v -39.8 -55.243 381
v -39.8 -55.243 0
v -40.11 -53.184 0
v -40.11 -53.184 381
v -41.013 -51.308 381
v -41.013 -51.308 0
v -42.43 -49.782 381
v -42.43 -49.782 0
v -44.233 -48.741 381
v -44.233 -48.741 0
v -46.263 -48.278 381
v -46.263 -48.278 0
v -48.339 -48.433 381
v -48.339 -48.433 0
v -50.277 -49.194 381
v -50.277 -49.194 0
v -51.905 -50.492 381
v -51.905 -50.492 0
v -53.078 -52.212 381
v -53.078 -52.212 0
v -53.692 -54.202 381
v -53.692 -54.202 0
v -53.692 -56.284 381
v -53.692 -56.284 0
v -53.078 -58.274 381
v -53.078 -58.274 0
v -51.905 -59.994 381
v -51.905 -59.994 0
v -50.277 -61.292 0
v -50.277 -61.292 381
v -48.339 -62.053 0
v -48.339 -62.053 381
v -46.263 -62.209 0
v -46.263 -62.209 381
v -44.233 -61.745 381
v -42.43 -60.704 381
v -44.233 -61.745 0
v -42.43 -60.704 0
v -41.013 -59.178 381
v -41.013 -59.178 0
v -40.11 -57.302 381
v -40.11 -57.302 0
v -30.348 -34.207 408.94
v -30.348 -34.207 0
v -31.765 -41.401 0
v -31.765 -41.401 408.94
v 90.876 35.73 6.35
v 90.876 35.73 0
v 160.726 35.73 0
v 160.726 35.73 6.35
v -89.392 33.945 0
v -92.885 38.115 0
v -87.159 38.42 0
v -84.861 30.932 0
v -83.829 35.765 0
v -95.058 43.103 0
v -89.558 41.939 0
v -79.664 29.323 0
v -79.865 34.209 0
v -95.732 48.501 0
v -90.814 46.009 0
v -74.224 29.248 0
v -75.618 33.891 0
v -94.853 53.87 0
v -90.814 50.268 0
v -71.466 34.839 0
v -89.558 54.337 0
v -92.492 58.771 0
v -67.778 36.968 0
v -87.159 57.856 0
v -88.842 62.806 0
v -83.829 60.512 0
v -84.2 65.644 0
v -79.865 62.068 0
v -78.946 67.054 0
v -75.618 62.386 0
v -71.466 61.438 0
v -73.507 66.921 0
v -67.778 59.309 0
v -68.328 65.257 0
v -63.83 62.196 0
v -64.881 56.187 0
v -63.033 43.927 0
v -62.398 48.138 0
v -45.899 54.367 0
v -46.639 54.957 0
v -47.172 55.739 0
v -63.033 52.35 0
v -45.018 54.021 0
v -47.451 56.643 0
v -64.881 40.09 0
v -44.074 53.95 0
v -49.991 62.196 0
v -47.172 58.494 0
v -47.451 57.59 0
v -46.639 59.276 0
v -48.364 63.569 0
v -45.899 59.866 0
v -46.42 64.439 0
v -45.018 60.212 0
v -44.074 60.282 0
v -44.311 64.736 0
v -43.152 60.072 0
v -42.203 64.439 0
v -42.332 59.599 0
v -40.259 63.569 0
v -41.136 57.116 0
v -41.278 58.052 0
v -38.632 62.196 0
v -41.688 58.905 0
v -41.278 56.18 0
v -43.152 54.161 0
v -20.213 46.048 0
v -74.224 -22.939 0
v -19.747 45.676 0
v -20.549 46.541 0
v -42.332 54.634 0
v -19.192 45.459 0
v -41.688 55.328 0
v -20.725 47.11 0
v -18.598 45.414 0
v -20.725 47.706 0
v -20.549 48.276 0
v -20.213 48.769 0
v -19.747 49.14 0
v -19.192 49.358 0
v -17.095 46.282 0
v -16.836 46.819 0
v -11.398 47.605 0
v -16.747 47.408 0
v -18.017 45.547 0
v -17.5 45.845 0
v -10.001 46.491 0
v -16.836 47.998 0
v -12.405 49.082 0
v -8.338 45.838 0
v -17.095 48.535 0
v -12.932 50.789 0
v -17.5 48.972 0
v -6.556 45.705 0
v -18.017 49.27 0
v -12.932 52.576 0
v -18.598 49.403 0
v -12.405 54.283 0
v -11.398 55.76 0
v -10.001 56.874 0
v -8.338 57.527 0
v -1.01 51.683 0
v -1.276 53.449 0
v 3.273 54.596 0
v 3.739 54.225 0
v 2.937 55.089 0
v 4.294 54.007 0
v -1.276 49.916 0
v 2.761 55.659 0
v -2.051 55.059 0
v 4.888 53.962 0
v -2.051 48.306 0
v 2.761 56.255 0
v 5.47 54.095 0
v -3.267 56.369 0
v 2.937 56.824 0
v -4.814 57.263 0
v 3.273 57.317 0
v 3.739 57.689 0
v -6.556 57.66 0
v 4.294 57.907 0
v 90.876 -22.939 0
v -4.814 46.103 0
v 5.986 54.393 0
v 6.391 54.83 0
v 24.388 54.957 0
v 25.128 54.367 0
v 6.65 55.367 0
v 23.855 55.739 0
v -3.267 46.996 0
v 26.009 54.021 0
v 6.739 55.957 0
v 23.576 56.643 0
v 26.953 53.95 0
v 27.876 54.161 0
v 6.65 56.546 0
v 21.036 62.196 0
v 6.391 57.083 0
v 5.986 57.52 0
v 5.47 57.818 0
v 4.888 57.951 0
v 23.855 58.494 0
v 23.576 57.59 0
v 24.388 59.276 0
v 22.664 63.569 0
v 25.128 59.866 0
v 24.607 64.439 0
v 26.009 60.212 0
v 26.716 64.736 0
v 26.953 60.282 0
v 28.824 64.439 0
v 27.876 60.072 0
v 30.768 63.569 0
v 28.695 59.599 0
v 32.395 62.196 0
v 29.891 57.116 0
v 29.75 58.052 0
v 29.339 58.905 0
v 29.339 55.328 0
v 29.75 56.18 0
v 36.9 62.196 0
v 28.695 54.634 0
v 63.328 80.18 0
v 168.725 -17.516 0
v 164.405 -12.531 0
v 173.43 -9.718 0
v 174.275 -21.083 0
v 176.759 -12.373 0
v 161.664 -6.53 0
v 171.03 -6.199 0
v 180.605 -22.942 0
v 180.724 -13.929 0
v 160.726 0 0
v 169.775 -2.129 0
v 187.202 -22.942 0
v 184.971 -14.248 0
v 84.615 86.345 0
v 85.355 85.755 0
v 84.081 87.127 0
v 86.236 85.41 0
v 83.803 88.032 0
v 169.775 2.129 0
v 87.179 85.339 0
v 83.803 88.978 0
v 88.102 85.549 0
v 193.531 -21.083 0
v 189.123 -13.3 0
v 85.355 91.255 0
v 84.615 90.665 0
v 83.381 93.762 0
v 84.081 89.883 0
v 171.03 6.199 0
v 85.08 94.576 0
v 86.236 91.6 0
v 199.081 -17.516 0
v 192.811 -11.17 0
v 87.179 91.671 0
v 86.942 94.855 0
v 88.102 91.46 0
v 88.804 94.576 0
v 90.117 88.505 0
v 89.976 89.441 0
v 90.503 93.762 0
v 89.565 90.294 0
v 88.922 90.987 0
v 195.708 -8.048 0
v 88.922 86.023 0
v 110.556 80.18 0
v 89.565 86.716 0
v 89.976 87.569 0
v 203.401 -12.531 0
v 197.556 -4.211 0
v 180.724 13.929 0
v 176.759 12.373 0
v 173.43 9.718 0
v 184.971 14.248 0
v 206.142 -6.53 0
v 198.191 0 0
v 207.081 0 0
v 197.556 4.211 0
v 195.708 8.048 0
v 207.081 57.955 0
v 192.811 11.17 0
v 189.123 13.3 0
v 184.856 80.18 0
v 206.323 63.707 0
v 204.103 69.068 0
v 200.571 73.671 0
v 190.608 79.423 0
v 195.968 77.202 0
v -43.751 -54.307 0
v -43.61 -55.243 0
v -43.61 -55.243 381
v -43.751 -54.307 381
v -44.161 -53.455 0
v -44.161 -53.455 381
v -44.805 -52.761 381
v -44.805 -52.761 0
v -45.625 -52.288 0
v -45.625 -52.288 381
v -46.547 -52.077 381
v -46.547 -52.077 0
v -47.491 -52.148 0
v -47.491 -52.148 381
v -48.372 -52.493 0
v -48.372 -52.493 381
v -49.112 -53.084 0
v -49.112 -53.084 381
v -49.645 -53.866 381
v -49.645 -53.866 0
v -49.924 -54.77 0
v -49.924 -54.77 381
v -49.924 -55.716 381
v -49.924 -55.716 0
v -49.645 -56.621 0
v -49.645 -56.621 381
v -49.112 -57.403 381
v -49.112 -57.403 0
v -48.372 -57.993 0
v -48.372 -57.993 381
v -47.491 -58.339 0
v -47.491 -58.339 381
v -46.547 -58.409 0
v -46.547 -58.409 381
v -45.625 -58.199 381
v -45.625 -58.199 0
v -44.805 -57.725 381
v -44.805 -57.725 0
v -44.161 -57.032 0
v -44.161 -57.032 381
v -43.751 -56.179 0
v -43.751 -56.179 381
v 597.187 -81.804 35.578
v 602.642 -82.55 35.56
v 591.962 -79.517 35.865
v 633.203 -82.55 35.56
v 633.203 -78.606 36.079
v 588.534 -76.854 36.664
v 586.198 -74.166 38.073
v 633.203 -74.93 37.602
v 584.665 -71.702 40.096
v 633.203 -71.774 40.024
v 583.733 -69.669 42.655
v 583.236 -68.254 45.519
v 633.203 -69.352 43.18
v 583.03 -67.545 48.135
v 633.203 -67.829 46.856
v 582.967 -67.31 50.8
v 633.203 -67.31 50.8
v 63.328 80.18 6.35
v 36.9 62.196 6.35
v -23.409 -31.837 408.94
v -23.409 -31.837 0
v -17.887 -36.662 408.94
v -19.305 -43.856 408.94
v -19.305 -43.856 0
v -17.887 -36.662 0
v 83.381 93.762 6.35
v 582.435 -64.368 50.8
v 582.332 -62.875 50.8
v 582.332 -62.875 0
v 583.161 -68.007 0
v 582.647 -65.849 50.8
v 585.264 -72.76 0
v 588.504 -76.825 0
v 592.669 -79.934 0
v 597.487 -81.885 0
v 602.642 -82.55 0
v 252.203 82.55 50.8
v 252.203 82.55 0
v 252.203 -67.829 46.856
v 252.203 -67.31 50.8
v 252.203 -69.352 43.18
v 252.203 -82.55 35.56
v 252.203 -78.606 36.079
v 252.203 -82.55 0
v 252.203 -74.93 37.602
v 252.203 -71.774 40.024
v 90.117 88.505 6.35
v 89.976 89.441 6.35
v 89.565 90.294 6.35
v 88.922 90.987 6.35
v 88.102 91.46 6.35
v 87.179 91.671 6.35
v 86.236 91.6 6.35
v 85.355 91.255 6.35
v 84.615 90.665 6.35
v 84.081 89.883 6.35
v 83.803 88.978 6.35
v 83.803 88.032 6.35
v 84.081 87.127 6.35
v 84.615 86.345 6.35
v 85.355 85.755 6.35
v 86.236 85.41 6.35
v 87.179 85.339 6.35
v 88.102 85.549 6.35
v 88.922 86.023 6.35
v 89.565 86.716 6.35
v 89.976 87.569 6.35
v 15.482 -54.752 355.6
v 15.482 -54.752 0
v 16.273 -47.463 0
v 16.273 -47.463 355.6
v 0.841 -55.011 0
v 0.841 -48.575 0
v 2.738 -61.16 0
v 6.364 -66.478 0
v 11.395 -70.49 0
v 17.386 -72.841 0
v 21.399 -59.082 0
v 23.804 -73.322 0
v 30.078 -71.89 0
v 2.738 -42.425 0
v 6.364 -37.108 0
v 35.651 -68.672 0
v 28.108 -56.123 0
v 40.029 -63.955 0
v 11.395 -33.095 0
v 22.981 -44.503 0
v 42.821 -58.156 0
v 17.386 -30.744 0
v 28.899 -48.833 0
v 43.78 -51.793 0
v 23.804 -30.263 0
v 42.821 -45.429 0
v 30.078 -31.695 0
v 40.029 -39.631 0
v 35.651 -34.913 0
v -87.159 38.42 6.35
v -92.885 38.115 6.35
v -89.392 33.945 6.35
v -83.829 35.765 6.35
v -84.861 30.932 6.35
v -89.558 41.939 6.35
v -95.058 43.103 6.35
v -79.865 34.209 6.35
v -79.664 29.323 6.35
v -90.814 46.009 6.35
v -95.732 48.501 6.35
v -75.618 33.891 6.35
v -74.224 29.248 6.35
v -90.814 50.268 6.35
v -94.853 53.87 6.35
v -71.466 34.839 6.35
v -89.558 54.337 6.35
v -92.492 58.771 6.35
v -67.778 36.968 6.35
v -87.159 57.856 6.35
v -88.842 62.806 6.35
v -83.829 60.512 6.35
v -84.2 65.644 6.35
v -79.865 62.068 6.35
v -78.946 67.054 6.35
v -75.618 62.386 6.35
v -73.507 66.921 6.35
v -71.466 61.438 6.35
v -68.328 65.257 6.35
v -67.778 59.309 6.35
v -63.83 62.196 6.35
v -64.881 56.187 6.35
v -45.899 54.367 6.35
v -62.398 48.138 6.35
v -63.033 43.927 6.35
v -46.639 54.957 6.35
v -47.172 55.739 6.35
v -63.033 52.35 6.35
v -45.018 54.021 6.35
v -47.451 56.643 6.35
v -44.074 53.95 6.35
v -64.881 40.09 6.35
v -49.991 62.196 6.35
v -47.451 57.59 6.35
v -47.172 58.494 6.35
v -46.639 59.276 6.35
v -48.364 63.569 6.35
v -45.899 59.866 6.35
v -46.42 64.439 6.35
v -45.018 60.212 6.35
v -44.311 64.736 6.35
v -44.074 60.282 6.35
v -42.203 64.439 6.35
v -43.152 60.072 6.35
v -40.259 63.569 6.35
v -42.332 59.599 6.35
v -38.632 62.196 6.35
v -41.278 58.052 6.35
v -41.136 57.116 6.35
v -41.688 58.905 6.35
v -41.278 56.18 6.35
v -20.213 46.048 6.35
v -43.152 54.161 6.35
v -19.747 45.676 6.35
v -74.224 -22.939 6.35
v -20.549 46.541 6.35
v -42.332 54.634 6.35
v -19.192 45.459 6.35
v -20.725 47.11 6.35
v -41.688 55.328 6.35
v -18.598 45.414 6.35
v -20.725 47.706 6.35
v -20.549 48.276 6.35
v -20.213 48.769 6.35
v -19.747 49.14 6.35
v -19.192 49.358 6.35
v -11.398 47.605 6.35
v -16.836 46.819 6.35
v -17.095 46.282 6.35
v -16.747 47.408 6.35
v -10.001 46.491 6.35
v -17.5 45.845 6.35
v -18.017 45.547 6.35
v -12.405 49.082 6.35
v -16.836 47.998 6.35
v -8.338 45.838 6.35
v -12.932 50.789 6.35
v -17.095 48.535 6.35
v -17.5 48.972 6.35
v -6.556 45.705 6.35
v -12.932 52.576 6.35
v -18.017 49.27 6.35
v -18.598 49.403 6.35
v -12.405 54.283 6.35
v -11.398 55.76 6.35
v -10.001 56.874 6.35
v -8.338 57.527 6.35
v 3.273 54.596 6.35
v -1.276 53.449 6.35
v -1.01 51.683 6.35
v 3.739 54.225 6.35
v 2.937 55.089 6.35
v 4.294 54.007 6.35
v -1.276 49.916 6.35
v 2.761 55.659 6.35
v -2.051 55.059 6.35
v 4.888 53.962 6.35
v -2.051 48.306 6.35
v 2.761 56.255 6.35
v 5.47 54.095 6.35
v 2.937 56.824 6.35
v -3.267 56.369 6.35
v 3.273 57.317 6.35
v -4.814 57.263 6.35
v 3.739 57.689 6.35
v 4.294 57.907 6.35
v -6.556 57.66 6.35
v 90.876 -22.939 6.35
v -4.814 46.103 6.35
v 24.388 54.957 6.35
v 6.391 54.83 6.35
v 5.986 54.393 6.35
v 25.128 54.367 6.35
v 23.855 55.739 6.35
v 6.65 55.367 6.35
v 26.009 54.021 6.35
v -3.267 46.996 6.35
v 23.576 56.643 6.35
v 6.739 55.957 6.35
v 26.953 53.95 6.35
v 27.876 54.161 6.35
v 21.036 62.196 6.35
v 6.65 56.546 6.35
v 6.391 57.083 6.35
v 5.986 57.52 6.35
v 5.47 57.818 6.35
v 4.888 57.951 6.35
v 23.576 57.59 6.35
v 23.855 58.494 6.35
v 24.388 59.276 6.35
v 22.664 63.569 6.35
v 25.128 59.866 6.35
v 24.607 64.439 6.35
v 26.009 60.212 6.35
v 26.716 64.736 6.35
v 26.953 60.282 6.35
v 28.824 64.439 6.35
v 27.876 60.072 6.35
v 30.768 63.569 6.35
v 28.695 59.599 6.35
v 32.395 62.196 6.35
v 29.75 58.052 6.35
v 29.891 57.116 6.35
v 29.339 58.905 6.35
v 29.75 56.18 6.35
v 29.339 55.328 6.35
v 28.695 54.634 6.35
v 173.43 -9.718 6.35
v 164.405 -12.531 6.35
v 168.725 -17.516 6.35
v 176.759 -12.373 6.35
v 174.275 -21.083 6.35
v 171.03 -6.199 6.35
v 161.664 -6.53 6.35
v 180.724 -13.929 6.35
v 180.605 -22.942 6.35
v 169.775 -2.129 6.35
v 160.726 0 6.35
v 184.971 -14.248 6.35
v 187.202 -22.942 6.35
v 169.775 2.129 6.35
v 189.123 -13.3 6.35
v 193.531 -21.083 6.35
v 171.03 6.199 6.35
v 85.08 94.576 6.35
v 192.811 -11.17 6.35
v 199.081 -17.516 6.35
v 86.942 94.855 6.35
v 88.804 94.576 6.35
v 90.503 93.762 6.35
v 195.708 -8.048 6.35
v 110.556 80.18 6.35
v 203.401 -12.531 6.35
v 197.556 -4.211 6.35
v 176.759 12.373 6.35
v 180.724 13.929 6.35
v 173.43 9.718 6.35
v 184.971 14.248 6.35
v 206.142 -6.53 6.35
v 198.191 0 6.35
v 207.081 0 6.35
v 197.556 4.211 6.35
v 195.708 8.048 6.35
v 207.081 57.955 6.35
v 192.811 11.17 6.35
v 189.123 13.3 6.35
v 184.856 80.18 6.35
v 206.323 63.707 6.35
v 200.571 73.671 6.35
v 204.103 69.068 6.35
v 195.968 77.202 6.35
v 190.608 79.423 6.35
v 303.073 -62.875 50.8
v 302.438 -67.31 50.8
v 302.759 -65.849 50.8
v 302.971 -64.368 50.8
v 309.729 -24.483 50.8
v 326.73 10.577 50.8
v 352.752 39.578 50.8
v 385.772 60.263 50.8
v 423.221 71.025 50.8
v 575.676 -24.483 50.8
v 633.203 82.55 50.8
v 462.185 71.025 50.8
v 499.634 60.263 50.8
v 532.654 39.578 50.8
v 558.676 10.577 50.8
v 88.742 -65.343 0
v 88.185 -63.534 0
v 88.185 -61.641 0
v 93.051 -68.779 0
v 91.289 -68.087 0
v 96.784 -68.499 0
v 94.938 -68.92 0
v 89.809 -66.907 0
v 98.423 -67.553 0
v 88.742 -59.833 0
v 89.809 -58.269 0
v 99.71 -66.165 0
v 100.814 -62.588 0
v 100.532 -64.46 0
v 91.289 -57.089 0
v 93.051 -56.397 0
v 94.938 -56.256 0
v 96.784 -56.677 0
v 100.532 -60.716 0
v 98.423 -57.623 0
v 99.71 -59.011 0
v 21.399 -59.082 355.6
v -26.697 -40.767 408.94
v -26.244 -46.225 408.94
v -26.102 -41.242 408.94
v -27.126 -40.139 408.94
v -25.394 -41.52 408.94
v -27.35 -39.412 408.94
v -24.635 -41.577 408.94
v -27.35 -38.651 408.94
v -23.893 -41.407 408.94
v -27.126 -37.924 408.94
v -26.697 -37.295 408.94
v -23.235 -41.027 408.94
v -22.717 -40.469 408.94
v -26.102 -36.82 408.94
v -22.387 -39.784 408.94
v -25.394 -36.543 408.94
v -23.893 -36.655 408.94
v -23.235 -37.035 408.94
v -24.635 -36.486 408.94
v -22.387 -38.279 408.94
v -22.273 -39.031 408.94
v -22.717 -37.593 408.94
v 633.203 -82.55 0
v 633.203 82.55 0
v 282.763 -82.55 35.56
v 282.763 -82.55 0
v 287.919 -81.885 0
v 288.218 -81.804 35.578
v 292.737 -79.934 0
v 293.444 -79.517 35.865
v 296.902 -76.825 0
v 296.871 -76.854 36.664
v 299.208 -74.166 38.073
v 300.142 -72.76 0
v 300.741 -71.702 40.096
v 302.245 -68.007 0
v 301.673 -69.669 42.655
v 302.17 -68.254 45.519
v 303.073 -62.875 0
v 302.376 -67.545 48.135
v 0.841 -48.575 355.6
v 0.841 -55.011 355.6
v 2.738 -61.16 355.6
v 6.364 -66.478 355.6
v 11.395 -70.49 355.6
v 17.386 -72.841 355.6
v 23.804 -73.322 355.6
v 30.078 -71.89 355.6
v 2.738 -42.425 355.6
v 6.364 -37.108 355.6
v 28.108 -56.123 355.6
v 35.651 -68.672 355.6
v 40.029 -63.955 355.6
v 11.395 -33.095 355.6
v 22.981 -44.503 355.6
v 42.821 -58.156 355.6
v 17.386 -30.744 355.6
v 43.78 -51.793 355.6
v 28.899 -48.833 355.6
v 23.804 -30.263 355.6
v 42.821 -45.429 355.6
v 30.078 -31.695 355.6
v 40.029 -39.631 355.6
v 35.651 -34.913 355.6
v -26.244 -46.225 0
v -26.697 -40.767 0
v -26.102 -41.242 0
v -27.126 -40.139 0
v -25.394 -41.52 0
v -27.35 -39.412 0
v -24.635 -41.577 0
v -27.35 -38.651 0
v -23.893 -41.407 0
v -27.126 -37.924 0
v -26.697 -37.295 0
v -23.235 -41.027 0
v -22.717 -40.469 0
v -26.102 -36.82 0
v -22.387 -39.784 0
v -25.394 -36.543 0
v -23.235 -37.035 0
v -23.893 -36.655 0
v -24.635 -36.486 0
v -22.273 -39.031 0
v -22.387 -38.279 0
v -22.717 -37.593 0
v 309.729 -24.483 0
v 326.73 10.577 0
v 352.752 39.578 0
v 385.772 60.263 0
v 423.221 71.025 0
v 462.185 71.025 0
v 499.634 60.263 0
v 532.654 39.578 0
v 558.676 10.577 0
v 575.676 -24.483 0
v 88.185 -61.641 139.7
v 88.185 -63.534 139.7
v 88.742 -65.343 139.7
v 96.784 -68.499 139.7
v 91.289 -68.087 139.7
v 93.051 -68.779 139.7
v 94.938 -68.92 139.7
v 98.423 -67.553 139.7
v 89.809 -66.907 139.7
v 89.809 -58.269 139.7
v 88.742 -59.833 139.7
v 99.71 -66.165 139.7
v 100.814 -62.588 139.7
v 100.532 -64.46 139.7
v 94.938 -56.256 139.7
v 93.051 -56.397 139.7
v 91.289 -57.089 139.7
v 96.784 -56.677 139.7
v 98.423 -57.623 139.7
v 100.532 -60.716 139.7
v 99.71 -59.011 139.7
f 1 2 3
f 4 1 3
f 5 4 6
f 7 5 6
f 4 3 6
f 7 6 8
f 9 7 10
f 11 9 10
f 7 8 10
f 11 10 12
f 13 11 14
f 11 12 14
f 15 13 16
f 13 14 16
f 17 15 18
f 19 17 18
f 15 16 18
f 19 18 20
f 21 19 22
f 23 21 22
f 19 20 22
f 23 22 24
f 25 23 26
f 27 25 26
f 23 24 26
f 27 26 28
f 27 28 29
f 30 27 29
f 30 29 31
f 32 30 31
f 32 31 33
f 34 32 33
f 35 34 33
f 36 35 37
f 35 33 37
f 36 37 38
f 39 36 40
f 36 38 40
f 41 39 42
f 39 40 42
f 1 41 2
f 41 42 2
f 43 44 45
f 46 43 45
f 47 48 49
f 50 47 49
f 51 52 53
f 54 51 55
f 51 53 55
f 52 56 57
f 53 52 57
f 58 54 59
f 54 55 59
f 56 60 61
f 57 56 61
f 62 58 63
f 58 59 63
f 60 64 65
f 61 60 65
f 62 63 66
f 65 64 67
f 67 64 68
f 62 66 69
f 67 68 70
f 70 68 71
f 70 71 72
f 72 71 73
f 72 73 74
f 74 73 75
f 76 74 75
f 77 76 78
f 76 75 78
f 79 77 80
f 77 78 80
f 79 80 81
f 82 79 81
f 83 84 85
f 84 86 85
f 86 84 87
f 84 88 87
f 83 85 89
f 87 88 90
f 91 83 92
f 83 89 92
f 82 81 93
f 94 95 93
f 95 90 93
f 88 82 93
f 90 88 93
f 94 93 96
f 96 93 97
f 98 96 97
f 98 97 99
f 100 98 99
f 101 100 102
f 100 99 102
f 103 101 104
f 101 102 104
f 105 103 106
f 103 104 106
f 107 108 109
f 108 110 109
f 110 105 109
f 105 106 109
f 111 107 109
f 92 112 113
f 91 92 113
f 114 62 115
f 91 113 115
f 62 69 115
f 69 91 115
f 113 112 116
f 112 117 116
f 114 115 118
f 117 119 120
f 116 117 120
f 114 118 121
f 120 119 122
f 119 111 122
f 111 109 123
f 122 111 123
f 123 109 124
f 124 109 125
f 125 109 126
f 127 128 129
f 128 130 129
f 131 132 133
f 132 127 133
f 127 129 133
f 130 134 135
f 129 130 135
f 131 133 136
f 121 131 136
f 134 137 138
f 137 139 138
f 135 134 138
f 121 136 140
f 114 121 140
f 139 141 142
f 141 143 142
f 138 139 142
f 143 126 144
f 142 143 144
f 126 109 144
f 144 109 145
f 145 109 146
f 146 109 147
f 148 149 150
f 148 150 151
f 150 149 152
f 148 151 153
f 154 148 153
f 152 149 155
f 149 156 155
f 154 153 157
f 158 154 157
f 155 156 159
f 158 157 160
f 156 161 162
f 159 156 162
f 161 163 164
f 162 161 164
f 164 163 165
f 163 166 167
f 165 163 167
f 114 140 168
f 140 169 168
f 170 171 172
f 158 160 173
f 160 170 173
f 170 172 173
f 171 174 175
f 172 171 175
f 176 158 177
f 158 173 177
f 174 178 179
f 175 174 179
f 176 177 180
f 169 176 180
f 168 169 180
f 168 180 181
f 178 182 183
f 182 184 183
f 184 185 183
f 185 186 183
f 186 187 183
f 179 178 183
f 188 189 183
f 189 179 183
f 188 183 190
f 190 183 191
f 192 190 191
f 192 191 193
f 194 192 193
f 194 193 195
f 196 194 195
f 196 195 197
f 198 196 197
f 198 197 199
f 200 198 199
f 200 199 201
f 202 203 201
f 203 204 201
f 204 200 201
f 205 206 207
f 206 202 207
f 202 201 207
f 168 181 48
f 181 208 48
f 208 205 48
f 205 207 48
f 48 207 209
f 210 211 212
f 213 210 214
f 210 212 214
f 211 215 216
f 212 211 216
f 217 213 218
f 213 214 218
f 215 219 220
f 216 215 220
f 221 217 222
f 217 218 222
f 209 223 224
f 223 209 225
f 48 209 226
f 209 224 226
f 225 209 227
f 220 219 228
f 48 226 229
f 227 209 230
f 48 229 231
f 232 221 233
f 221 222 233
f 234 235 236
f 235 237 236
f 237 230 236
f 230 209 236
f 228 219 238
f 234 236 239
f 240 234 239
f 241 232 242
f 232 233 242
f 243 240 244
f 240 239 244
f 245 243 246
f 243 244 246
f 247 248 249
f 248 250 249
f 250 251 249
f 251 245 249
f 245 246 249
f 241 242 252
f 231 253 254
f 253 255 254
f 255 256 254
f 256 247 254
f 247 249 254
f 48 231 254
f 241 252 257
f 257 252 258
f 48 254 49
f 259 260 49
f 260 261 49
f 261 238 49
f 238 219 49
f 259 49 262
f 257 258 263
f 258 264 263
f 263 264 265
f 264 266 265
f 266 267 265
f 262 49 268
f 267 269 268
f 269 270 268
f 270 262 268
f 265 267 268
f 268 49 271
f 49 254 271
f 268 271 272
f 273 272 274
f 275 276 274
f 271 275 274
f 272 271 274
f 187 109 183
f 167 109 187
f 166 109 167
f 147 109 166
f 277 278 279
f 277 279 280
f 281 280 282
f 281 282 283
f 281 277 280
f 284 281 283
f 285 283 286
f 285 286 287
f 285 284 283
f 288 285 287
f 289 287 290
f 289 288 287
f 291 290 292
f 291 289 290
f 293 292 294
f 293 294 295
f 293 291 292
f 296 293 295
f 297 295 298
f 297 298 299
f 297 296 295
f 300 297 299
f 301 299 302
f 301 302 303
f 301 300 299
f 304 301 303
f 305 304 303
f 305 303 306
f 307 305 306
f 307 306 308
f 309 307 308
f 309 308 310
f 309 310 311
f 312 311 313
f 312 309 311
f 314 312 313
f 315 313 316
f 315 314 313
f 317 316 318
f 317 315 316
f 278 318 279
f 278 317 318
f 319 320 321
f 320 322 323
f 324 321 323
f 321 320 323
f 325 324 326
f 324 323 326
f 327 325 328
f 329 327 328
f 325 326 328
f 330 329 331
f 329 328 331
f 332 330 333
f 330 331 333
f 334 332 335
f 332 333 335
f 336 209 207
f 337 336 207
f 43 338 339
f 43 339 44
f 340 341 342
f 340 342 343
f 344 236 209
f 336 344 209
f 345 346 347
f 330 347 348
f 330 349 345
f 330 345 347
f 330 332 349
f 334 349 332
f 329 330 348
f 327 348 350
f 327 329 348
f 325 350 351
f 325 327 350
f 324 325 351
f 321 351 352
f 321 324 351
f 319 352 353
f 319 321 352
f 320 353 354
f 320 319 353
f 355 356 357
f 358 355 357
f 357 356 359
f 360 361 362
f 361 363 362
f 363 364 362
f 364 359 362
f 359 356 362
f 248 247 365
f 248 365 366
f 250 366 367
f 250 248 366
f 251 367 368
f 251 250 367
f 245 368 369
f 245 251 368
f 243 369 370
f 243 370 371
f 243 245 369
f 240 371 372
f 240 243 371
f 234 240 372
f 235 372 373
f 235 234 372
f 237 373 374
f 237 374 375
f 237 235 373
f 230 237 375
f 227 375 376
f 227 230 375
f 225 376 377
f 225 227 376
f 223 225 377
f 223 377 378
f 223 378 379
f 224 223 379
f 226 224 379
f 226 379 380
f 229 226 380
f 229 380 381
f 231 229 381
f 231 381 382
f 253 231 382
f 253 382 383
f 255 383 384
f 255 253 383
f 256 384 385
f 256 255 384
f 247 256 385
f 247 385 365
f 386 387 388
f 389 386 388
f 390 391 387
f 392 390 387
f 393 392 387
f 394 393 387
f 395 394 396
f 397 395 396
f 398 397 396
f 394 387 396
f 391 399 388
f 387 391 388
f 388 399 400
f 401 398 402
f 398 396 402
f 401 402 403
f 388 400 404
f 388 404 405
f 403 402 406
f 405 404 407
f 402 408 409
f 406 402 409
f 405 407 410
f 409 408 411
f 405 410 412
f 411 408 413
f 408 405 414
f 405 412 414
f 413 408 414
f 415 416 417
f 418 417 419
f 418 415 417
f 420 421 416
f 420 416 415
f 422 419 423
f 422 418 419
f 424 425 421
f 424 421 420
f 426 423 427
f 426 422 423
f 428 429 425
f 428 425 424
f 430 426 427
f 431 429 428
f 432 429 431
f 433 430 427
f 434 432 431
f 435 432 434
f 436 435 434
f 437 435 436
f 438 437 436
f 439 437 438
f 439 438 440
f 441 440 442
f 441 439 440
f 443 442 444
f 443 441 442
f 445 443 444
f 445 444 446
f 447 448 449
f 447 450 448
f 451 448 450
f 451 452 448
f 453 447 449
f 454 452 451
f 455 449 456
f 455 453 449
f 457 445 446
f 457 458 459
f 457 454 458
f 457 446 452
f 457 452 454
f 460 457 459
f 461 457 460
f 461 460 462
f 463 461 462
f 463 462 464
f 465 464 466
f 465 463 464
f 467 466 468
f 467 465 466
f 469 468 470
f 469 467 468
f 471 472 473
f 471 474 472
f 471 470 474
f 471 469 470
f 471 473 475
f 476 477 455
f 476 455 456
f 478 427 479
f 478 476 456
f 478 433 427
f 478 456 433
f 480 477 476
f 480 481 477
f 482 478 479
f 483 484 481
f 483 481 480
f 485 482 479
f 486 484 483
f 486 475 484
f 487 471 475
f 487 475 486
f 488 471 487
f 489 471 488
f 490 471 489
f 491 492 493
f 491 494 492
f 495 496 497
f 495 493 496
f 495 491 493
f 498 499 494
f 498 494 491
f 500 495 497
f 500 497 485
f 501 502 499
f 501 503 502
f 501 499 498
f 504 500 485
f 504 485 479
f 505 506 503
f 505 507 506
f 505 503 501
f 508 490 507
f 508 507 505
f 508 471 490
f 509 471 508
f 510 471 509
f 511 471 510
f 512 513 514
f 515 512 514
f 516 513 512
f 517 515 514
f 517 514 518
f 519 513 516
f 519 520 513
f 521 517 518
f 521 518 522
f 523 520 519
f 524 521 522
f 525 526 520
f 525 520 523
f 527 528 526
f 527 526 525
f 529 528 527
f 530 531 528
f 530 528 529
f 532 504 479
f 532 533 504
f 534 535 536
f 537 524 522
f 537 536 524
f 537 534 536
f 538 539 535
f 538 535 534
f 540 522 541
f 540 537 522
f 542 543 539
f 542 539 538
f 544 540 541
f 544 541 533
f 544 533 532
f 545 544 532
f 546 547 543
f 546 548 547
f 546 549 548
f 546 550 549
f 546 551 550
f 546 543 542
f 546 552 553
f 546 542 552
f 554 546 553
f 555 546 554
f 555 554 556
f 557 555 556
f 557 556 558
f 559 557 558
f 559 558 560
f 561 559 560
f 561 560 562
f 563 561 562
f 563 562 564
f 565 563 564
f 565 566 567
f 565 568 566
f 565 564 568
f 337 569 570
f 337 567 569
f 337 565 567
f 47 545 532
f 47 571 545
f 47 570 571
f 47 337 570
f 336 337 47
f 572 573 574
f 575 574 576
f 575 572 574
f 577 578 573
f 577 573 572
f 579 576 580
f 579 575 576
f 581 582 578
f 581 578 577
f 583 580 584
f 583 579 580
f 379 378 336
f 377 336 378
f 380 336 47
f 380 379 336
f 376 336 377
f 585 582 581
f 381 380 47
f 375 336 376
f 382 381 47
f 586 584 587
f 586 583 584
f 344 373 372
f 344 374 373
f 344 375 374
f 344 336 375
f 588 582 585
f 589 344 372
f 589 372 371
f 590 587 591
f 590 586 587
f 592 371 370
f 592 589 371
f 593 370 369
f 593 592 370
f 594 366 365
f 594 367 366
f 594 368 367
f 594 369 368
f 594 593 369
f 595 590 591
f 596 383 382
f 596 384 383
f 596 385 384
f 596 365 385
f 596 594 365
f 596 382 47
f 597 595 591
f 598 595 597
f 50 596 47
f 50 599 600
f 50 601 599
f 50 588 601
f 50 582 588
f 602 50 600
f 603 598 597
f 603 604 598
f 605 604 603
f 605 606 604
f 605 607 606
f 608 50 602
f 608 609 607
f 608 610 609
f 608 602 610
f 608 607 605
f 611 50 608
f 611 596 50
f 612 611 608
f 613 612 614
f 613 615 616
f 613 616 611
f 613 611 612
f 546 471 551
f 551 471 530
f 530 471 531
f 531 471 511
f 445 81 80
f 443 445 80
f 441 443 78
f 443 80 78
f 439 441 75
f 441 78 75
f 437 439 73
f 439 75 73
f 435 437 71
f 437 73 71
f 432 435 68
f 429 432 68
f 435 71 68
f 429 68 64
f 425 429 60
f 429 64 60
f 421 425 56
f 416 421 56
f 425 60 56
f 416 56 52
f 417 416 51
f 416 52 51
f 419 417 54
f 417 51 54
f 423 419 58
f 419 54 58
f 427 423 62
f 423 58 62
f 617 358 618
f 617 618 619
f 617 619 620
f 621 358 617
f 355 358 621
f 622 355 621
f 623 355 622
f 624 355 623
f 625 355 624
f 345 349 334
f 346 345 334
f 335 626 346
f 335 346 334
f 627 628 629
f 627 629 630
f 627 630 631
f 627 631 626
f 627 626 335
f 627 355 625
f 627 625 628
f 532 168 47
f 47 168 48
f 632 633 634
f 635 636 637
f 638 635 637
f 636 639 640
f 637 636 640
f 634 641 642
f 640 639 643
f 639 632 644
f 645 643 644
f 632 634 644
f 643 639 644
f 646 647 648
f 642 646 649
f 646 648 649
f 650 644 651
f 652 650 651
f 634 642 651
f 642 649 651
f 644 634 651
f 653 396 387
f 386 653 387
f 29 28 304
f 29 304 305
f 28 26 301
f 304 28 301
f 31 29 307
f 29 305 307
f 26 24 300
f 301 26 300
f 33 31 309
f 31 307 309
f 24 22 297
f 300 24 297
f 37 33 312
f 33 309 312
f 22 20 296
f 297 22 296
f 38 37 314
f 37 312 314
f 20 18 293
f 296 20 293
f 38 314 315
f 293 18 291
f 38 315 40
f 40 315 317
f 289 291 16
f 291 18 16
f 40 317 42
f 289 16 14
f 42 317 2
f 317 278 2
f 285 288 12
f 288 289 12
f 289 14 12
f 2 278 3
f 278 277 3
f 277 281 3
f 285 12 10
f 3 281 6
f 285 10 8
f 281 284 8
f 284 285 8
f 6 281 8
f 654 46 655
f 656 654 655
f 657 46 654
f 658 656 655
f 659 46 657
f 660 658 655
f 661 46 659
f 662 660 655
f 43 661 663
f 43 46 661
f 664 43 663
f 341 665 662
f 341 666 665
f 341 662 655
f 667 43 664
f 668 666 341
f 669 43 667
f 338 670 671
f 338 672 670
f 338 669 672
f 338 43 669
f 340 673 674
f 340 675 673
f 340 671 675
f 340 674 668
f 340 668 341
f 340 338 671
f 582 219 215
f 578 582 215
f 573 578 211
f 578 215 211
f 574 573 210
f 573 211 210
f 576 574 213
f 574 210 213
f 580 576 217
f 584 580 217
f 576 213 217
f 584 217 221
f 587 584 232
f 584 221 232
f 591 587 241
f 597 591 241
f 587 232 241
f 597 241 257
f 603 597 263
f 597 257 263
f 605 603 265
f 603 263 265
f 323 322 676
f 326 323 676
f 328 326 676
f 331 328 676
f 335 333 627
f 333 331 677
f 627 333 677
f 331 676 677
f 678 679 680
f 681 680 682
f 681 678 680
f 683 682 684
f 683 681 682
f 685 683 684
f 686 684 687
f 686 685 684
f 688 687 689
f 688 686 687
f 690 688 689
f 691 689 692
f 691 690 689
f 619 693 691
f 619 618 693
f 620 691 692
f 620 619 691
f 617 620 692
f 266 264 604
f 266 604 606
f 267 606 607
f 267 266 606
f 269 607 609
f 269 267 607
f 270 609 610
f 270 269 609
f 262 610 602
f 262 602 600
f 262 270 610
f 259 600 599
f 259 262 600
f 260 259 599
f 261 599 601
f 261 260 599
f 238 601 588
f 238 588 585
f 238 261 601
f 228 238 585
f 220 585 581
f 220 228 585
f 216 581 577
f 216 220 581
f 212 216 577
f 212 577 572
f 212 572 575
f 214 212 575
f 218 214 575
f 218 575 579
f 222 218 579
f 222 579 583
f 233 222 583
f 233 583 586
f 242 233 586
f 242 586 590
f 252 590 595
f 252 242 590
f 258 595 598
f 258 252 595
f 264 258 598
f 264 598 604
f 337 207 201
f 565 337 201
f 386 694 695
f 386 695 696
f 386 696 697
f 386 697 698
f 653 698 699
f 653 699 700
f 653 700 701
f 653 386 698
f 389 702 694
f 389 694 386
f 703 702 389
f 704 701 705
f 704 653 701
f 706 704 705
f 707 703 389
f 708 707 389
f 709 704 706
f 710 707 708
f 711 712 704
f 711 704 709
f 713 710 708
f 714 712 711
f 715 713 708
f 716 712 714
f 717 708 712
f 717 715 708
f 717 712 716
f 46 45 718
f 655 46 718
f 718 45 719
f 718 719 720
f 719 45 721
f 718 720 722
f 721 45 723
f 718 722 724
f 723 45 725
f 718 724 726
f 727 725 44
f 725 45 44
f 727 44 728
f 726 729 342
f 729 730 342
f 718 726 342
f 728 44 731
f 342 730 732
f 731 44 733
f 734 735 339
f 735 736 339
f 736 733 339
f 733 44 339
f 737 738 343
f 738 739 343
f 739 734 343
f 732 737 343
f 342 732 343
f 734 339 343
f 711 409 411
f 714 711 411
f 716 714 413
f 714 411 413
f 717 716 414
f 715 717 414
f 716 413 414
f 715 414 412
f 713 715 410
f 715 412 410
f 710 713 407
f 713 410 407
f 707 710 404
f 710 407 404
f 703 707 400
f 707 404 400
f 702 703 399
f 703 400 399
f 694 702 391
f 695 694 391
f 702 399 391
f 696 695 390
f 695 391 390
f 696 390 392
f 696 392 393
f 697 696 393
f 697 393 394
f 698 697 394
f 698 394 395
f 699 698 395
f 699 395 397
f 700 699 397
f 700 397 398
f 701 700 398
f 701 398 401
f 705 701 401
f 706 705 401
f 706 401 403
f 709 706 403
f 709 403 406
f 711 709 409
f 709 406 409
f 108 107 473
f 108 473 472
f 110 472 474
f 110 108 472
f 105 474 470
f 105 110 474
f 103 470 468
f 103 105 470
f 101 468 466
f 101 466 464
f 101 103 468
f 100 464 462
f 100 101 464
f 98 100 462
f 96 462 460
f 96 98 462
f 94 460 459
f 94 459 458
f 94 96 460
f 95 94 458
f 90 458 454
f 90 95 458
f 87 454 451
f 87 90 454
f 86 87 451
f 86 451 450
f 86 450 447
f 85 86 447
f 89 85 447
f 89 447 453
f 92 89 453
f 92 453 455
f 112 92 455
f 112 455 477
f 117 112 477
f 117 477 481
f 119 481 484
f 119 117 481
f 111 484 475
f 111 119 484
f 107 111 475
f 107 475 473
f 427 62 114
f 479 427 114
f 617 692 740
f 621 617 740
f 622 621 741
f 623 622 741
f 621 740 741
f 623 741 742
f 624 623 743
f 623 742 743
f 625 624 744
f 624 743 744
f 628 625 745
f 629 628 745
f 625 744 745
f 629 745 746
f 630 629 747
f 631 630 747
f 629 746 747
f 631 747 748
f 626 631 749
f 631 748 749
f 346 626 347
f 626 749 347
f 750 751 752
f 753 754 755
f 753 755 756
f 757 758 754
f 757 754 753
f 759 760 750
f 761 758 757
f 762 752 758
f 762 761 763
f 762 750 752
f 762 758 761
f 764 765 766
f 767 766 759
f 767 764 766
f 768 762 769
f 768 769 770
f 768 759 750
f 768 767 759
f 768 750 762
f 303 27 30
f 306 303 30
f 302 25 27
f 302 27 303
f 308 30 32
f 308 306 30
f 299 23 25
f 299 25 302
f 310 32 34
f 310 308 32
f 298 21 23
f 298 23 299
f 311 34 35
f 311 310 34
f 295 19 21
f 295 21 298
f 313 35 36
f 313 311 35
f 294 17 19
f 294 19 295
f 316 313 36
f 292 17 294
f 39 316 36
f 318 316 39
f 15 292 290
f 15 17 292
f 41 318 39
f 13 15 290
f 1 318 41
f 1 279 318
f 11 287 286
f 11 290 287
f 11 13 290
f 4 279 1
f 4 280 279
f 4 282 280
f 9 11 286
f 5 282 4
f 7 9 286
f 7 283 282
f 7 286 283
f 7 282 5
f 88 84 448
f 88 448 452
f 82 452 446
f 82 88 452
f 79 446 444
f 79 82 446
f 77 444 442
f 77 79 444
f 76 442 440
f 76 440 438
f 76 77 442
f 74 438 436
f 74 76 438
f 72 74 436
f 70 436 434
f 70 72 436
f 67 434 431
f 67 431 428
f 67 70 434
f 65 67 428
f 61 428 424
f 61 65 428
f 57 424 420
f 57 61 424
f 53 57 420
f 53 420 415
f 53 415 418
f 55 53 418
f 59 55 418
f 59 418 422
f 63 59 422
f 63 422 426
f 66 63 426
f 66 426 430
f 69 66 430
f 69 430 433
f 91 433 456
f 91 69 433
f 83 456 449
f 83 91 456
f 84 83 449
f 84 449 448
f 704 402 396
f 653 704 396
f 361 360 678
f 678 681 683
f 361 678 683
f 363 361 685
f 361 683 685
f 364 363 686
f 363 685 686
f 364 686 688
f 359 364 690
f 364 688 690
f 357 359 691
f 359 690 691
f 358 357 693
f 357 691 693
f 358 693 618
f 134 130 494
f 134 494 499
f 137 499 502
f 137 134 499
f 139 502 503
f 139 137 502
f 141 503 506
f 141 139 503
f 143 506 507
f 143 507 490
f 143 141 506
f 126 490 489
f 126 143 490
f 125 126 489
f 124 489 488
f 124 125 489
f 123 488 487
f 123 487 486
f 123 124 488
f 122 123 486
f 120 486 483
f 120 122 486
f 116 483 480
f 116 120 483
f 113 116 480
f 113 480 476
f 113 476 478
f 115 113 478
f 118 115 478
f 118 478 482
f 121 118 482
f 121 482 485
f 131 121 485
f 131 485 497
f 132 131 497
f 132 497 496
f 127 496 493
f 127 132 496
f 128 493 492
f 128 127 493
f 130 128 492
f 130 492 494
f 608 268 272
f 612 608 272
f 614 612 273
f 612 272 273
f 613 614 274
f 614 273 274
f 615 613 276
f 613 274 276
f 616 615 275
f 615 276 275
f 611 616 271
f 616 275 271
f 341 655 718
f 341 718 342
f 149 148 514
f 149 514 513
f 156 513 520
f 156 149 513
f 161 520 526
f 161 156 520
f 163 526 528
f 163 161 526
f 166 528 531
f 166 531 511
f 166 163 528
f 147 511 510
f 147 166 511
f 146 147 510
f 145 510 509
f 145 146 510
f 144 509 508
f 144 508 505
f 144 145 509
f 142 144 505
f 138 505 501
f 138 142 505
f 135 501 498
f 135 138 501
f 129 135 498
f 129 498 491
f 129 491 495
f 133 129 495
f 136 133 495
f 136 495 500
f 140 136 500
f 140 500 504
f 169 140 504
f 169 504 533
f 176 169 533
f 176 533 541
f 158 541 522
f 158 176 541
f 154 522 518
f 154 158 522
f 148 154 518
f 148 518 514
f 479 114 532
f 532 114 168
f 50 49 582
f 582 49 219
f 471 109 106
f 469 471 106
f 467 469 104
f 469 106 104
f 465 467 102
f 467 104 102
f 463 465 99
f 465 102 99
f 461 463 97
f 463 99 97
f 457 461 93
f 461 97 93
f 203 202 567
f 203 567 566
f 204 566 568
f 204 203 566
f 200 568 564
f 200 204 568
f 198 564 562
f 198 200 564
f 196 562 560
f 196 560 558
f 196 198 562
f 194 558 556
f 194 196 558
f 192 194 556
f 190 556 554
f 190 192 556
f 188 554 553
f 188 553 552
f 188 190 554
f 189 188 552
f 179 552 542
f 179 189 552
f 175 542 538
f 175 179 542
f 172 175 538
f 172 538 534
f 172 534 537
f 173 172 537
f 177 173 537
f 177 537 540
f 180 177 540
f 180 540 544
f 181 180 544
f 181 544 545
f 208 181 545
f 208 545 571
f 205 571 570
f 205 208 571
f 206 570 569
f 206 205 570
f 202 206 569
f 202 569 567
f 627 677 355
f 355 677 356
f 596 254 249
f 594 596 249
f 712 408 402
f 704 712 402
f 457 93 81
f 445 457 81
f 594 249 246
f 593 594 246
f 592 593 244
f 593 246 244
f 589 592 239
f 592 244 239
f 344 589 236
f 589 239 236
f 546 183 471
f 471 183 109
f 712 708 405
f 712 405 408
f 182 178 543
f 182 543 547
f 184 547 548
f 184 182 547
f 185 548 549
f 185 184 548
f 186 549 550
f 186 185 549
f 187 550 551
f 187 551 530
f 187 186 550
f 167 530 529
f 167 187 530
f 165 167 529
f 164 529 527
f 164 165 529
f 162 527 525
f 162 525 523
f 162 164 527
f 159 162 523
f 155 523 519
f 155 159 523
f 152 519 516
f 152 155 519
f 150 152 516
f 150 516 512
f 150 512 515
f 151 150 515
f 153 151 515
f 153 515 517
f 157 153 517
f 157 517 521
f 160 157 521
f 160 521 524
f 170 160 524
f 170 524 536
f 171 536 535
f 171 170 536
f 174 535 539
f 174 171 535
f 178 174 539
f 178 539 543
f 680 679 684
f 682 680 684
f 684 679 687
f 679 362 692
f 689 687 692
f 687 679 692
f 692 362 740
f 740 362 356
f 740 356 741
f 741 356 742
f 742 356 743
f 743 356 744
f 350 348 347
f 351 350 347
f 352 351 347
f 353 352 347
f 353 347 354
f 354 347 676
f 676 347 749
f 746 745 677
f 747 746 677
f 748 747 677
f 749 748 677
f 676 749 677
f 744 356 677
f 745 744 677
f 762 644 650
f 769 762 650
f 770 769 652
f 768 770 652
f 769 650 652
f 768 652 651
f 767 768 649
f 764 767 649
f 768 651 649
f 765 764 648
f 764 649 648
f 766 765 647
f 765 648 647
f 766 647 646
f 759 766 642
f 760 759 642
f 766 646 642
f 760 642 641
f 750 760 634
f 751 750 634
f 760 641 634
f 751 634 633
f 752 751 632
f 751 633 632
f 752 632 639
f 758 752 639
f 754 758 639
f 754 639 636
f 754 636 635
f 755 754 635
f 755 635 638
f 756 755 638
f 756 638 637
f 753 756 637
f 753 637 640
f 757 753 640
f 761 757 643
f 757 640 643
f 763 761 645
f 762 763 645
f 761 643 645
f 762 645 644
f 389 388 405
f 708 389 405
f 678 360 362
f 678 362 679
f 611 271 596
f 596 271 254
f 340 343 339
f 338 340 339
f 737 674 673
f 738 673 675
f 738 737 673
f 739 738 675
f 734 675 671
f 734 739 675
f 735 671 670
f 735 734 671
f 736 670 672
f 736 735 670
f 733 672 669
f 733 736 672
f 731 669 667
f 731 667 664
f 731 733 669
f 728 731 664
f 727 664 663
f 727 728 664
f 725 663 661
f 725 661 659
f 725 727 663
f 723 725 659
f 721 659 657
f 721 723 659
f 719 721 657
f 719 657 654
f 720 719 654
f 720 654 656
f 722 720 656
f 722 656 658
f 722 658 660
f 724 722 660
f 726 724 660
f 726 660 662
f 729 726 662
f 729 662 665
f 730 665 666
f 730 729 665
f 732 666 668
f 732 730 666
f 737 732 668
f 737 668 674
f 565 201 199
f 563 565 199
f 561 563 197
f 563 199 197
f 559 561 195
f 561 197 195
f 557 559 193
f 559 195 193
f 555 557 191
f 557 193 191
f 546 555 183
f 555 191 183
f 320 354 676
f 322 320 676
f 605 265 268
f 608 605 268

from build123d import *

# Parameters (mm, degrees)
F1_R      = 14.2875
F1_R_2    = 3.175
F1_R_3    = 2
F1_R_4    = 5.9944
F2_DEPTH  = 6.35
F3_R      = 6.985
F3_R_2    = 3.175
F4_DEPTH  = 381
F5_R      = 2.5527
F6_DEPTH  = 408.94
F7_R      = 21.59
F8_DEPTH  = 355.6
F10_DEPTH = 50.8
F11_R     = 20.32
F13_DEPTH = 381
F14_R     = 6.35
F15_DEPTH = 139.7


with BuildPart() as f2:
    # F1 (on Top) → F2 (new body)
    with BuildSketch(Plane.XY):
        with BuildLine():
            Line((-49.9910764957, 62.1962980512), (-63.8297284243, 62.1962980512))
            ThreePointArc((-63.8297284243, 62.1962980512), (-94.8530671804, 53.8699299137), (-74.2244912377, 29.2480329821))
            Line((-74.2244912377, 29.2480329821), (-74.2244912377, -22.9390313281))
            Line((-74.2244912377, -22.9390313281), (90.8755087623, -22.9390313281))
            Line((90.8755087623, -22.9390313281), (90.8755087623, 35.7300707037))
            Line((90.8755087623, 35.7300707037), (160.7255087623, 35.7300707037))
            Line((160.7255087623, 35.7300707037), (160.7255087623, 0))
            ThreePointArc((160.7255087623, 0), (183.9030087623, -23.1775), (207.0805087623, 0))
            Line((207.0805087623, 0), (207.0805087623, 57.9550707037))
            ThreePointArc((207.0805087623, 57.9550707037), (200.5709569742, 73.6705189156), (184.8555087623, 80.1800707037))
            Line((184.8555087623, 80.1800707037), (110.5558629778, 80.1800707037))
            Line((110.5558629778, 80.1800707037), (90.5031153064, 93.7624556725))
            ThreePointArc((90.5031153064, 93.7624556725), (86.9420412896, 94.8549608464), (83.3809672727, 93.7624556725))
            Line((83.3809672727, 93.7624556725), (63.3282196013, 80.1800707037))
            Line((63.3282196013, 80.1800707037), (36.9001390489, 62.1962980512))
            Line((36.9001390489, 62.1962980512), (32.3953867519, 62.1962980512))
            ThreePointArc((32.3953867519, 62.1962980512), (26.7157740891, 64.7362980512), (21.0361614262, 62.1962980512))
            Line((21.0361614262, 62.1962980512), (-38.63185117, 62.1962980512))
            ThreePointArc((-38.63185117, 62.1962980512), (-44.3114638329, 64.7362980512), (-49.9910764957, 62.1962980512))
        make_face()
        with Locations((183.9030087623, 0)):
            Circle(F1_R, mode=Mode.SUBTRACT)
        with Locations((-76.6857422854, 48.1383676345)):
            Circle(F1_R, mode=Mode.SUBTRACT)
        with Locations((-44.3114638329, 57.1162980512)):
            Circle(F1_R_2, mode=Mode.SUBTRACT)
        with Locations((-18.747377767, 47.4084117594)):
            Circle(F1_R_3, mode=Mode.SUBTRACT)
        with Locations((-7.0042270236, 51.6825690866)):
            Circle(F1_R_4, mode=Mode.SUBTRACT)
        with Locations((4.7389237199, 55.9567264137)):
            Circle(F1_R_3, mode=Mode.SUBTRACT)
        with Locations((26.7157740891, 57.1162980512)):
            Circle(F1_R_2, mode=Mode.SUBTRACT)
        with Locations((86.9420412896, 88.5049608464)):
            Circle(F1_R_2, mode=Mode.SUBTRACT)
    extrude(amount=F2_DEPTH)


with BuildPart() as f4:
    # F3 (on Top) → F4 (new body)
    with BuildSketch(Plane.XY):
        with Locations((-46.784657985, -55.2431158721)):
            Circle(F3_R)
        with Locations((-46.784657985, -55.2431158721)):
            Circle(F3_R_2, mode=Mode.SUBTRACT)
    extrude(amount=F4_DEPTH)


with BuildPart() as f6:
    # F5 (on Top) → F6 (new body)
    with BuildSketch(Plane.XY):
        Polygon((-26.2436224322, -46.2252245101), (-19.3046554622, -43.8558214793), (-17.8871351937, -36.6617982918), (-23.4085818952, -31.8371781352), (-30.3475488653, -34.206581166), (-31.7650691337, -41.4006043535), align=None)
        with Locations((-24.8261021637, -39.0312013227)):
            Circle(F5_R, mode=Mode.SUBTRACT)
    extrude(amount=F6_DEPTH)


with BuildPart() as f8:
    # F7 (on Top) → F8 (new body)
    with BuildSketch(Plane.XY):
        with Locations((22.1902159048, -51.7927211475)):
            Circle(F7_R)
        Polygon((28.8987125921, -48.8330918581), (28.1075783988, -56.1226350552), (21.3990817115, -59.0822643445), (15.4817192176, -54.7523504368), (16.2728534109, -47.4628072397), (22.9813500981, -44.5031779504), align=None, mode=Mode.SUBTRACT)
    extrude(amount=F8_DEPTH)


with BuildPart() as f10:
    # F9 (on Top) → F10 (new body)
    with BuildSketch(Plane.XY):
        with BuildLine():
            Line((633.202808857, 82.55), (252.202808857, 82.55))
            Line((252.202808857, 82.55), (252.202808857, -82.55))
            Line((252.202808857, -82.55), (303.8365696193, -82.55))
            ThreePointArc((303.8365696193, -82.55), (442.702808857, 72.39), (581.5690480946, -82.55))
            Line((581.5690480946, -82.55), (633.202808857, -82.55))
            Line((633.202808857, -82.55), (633.202808857, 82.55))
        make_face()
    extrude(amount=F10_DEPTH)

    # F11
    f11_edges = [f10.edges().sort_by_distance(p)[0] for p in [
        (303.83657, -82.55, 25.4),
        (581.569048, -82.55, 25.4),
    ]]
    fillet(f11_edges, radius=F11_R)

    # F12 (on face) → F13 (cut, through all)
    with BuildSketch(Plane.YZ.offset(633.202808857)):
        with BuildLine():
            Line((-82.55, 50.8), (-82.55, 35.56))
            ThreePointArc((-82.55, 35.56), (-71.7736926547, 40.0236926547), (-67.31, 50.8))
            Line((-67.31, 50.8), (-82.55, 50.8))
        make_face()
    extrude(amount=-F13_DEPTH, mode=Mode.SUBTRACT)


with BuildPart() as f15:
    # F14 (on Top) → F15 (new body)
    with BuildSketch(Plane.XY):
        with Locations((94.4636166096, -62.587916851)):
            Circle(F14_R)
    extrude(amount=F15_DEPTH)


solid = Compound([f2.part, f4.part, f6.part, f8.part, f10.part, f15.part])
